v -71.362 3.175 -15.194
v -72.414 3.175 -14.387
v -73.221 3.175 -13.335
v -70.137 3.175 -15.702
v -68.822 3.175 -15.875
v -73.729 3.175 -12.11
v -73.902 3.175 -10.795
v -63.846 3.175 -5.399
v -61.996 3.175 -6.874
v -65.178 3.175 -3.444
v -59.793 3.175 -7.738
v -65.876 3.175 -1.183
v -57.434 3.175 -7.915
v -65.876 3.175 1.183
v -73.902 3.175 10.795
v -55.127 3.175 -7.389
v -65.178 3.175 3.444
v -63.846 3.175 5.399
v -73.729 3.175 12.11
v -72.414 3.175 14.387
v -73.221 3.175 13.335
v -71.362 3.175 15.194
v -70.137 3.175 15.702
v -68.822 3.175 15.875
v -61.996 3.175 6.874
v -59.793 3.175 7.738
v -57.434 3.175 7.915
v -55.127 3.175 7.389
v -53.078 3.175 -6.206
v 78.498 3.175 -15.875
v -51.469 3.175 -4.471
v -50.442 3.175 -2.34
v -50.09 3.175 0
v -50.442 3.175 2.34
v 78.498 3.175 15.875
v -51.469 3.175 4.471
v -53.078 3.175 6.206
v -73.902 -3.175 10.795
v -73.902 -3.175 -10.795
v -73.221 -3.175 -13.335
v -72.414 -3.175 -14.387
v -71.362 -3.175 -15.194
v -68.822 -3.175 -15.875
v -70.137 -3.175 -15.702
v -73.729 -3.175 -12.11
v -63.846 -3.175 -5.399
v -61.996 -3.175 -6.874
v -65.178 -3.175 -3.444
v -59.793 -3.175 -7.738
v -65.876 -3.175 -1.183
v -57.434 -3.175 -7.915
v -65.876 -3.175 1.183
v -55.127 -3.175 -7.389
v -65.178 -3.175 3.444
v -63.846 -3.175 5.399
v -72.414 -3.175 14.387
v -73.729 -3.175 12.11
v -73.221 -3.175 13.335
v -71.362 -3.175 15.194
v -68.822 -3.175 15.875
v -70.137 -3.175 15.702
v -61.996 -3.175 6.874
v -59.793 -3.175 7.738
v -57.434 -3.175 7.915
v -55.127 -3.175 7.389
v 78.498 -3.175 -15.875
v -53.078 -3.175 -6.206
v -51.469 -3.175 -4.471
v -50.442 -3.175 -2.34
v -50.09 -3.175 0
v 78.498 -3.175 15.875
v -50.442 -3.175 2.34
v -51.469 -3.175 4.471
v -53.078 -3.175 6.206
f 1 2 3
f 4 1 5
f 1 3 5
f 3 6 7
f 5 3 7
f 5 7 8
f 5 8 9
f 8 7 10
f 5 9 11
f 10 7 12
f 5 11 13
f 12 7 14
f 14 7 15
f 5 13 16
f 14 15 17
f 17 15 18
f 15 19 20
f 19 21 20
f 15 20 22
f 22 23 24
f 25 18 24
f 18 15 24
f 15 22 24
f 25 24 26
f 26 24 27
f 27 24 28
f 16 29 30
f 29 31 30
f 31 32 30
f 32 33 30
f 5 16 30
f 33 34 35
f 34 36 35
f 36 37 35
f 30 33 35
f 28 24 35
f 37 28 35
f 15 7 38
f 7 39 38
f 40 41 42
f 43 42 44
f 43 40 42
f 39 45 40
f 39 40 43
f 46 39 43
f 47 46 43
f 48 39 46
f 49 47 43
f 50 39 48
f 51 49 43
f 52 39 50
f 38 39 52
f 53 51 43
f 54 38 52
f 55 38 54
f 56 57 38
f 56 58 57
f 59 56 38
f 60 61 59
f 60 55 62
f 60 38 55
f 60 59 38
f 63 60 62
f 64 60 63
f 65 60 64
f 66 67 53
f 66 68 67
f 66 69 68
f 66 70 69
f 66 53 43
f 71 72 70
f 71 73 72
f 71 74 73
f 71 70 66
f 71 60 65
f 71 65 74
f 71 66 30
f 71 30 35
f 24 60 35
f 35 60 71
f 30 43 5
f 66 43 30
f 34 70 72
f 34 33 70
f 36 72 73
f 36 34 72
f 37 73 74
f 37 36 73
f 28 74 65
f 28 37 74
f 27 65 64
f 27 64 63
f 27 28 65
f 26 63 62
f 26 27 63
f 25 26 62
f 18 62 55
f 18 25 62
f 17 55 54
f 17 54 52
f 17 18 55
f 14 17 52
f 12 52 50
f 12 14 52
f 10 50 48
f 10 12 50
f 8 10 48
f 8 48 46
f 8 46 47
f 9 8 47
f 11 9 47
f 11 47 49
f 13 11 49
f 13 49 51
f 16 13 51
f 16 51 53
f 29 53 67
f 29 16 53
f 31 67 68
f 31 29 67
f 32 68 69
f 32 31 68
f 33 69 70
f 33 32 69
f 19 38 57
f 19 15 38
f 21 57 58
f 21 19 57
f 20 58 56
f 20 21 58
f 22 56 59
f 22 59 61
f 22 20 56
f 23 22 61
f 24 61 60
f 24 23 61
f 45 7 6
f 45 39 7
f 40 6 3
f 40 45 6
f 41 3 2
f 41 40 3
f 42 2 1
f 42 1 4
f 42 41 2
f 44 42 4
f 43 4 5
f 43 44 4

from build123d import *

# Parameters (mm, degrees)
F0_W     = 152.4
F0_H     = 31.75
F0_R     = 7.9375
F1_DEPTH = 3.175
F2_R     = 5.08


with BuildPart() as f1:
    # F0 (on Front) → F1 (new body, symmetric)
    with BuildSketch(Plane.XZ):
        with Locations((2.297985, 0)):
            Rectangle(F0_W, F0_H)
        with Locations((-58.027015, 0)):
            Circle(F0_R, mode=Mode.SUBTRACT)
    extrude(amount=F1_DEPTH, both=True)

    # F2
    f2_edges = [f1.edges().sort_by_distance(p)[0] for p in [
        (-73.902015, 0, 15.875),
        (-73.902015, 0, -15.875),
    ]]
    fillet(f2_edges, radius=F2_R)


solid = f1.part
